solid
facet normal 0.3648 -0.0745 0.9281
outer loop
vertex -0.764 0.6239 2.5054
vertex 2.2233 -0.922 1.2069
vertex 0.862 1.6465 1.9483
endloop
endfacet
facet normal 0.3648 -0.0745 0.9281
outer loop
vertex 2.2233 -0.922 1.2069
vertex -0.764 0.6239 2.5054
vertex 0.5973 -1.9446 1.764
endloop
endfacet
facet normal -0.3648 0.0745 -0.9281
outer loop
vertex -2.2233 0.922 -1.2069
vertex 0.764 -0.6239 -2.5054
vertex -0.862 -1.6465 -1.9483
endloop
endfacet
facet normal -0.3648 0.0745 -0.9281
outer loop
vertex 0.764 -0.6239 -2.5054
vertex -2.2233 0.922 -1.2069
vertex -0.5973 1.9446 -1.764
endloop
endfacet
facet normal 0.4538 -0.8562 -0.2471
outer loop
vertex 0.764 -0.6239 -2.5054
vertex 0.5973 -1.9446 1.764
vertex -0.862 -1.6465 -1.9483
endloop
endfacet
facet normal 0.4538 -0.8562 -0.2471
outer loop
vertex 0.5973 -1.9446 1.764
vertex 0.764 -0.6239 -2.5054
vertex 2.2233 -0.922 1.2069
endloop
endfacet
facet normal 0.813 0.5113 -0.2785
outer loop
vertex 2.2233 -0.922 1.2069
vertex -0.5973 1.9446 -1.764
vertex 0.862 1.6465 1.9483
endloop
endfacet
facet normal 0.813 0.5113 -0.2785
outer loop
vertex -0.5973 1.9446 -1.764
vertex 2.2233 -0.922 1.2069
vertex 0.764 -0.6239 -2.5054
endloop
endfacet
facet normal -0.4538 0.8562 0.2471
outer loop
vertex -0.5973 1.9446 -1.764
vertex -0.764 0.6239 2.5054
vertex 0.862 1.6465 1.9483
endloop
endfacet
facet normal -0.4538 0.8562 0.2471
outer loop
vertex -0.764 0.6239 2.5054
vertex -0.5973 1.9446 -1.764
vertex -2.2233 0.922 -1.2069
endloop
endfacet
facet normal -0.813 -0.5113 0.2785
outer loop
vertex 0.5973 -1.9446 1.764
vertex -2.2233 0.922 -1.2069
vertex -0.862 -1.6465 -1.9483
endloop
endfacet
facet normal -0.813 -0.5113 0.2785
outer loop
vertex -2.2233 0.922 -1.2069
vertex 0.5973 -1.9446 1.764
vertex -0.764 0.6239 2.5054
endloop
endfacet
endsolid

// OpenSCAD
rotate(a=37, v=[1, 2, 3]) cube(size=[2, 3, 4], center=true);
